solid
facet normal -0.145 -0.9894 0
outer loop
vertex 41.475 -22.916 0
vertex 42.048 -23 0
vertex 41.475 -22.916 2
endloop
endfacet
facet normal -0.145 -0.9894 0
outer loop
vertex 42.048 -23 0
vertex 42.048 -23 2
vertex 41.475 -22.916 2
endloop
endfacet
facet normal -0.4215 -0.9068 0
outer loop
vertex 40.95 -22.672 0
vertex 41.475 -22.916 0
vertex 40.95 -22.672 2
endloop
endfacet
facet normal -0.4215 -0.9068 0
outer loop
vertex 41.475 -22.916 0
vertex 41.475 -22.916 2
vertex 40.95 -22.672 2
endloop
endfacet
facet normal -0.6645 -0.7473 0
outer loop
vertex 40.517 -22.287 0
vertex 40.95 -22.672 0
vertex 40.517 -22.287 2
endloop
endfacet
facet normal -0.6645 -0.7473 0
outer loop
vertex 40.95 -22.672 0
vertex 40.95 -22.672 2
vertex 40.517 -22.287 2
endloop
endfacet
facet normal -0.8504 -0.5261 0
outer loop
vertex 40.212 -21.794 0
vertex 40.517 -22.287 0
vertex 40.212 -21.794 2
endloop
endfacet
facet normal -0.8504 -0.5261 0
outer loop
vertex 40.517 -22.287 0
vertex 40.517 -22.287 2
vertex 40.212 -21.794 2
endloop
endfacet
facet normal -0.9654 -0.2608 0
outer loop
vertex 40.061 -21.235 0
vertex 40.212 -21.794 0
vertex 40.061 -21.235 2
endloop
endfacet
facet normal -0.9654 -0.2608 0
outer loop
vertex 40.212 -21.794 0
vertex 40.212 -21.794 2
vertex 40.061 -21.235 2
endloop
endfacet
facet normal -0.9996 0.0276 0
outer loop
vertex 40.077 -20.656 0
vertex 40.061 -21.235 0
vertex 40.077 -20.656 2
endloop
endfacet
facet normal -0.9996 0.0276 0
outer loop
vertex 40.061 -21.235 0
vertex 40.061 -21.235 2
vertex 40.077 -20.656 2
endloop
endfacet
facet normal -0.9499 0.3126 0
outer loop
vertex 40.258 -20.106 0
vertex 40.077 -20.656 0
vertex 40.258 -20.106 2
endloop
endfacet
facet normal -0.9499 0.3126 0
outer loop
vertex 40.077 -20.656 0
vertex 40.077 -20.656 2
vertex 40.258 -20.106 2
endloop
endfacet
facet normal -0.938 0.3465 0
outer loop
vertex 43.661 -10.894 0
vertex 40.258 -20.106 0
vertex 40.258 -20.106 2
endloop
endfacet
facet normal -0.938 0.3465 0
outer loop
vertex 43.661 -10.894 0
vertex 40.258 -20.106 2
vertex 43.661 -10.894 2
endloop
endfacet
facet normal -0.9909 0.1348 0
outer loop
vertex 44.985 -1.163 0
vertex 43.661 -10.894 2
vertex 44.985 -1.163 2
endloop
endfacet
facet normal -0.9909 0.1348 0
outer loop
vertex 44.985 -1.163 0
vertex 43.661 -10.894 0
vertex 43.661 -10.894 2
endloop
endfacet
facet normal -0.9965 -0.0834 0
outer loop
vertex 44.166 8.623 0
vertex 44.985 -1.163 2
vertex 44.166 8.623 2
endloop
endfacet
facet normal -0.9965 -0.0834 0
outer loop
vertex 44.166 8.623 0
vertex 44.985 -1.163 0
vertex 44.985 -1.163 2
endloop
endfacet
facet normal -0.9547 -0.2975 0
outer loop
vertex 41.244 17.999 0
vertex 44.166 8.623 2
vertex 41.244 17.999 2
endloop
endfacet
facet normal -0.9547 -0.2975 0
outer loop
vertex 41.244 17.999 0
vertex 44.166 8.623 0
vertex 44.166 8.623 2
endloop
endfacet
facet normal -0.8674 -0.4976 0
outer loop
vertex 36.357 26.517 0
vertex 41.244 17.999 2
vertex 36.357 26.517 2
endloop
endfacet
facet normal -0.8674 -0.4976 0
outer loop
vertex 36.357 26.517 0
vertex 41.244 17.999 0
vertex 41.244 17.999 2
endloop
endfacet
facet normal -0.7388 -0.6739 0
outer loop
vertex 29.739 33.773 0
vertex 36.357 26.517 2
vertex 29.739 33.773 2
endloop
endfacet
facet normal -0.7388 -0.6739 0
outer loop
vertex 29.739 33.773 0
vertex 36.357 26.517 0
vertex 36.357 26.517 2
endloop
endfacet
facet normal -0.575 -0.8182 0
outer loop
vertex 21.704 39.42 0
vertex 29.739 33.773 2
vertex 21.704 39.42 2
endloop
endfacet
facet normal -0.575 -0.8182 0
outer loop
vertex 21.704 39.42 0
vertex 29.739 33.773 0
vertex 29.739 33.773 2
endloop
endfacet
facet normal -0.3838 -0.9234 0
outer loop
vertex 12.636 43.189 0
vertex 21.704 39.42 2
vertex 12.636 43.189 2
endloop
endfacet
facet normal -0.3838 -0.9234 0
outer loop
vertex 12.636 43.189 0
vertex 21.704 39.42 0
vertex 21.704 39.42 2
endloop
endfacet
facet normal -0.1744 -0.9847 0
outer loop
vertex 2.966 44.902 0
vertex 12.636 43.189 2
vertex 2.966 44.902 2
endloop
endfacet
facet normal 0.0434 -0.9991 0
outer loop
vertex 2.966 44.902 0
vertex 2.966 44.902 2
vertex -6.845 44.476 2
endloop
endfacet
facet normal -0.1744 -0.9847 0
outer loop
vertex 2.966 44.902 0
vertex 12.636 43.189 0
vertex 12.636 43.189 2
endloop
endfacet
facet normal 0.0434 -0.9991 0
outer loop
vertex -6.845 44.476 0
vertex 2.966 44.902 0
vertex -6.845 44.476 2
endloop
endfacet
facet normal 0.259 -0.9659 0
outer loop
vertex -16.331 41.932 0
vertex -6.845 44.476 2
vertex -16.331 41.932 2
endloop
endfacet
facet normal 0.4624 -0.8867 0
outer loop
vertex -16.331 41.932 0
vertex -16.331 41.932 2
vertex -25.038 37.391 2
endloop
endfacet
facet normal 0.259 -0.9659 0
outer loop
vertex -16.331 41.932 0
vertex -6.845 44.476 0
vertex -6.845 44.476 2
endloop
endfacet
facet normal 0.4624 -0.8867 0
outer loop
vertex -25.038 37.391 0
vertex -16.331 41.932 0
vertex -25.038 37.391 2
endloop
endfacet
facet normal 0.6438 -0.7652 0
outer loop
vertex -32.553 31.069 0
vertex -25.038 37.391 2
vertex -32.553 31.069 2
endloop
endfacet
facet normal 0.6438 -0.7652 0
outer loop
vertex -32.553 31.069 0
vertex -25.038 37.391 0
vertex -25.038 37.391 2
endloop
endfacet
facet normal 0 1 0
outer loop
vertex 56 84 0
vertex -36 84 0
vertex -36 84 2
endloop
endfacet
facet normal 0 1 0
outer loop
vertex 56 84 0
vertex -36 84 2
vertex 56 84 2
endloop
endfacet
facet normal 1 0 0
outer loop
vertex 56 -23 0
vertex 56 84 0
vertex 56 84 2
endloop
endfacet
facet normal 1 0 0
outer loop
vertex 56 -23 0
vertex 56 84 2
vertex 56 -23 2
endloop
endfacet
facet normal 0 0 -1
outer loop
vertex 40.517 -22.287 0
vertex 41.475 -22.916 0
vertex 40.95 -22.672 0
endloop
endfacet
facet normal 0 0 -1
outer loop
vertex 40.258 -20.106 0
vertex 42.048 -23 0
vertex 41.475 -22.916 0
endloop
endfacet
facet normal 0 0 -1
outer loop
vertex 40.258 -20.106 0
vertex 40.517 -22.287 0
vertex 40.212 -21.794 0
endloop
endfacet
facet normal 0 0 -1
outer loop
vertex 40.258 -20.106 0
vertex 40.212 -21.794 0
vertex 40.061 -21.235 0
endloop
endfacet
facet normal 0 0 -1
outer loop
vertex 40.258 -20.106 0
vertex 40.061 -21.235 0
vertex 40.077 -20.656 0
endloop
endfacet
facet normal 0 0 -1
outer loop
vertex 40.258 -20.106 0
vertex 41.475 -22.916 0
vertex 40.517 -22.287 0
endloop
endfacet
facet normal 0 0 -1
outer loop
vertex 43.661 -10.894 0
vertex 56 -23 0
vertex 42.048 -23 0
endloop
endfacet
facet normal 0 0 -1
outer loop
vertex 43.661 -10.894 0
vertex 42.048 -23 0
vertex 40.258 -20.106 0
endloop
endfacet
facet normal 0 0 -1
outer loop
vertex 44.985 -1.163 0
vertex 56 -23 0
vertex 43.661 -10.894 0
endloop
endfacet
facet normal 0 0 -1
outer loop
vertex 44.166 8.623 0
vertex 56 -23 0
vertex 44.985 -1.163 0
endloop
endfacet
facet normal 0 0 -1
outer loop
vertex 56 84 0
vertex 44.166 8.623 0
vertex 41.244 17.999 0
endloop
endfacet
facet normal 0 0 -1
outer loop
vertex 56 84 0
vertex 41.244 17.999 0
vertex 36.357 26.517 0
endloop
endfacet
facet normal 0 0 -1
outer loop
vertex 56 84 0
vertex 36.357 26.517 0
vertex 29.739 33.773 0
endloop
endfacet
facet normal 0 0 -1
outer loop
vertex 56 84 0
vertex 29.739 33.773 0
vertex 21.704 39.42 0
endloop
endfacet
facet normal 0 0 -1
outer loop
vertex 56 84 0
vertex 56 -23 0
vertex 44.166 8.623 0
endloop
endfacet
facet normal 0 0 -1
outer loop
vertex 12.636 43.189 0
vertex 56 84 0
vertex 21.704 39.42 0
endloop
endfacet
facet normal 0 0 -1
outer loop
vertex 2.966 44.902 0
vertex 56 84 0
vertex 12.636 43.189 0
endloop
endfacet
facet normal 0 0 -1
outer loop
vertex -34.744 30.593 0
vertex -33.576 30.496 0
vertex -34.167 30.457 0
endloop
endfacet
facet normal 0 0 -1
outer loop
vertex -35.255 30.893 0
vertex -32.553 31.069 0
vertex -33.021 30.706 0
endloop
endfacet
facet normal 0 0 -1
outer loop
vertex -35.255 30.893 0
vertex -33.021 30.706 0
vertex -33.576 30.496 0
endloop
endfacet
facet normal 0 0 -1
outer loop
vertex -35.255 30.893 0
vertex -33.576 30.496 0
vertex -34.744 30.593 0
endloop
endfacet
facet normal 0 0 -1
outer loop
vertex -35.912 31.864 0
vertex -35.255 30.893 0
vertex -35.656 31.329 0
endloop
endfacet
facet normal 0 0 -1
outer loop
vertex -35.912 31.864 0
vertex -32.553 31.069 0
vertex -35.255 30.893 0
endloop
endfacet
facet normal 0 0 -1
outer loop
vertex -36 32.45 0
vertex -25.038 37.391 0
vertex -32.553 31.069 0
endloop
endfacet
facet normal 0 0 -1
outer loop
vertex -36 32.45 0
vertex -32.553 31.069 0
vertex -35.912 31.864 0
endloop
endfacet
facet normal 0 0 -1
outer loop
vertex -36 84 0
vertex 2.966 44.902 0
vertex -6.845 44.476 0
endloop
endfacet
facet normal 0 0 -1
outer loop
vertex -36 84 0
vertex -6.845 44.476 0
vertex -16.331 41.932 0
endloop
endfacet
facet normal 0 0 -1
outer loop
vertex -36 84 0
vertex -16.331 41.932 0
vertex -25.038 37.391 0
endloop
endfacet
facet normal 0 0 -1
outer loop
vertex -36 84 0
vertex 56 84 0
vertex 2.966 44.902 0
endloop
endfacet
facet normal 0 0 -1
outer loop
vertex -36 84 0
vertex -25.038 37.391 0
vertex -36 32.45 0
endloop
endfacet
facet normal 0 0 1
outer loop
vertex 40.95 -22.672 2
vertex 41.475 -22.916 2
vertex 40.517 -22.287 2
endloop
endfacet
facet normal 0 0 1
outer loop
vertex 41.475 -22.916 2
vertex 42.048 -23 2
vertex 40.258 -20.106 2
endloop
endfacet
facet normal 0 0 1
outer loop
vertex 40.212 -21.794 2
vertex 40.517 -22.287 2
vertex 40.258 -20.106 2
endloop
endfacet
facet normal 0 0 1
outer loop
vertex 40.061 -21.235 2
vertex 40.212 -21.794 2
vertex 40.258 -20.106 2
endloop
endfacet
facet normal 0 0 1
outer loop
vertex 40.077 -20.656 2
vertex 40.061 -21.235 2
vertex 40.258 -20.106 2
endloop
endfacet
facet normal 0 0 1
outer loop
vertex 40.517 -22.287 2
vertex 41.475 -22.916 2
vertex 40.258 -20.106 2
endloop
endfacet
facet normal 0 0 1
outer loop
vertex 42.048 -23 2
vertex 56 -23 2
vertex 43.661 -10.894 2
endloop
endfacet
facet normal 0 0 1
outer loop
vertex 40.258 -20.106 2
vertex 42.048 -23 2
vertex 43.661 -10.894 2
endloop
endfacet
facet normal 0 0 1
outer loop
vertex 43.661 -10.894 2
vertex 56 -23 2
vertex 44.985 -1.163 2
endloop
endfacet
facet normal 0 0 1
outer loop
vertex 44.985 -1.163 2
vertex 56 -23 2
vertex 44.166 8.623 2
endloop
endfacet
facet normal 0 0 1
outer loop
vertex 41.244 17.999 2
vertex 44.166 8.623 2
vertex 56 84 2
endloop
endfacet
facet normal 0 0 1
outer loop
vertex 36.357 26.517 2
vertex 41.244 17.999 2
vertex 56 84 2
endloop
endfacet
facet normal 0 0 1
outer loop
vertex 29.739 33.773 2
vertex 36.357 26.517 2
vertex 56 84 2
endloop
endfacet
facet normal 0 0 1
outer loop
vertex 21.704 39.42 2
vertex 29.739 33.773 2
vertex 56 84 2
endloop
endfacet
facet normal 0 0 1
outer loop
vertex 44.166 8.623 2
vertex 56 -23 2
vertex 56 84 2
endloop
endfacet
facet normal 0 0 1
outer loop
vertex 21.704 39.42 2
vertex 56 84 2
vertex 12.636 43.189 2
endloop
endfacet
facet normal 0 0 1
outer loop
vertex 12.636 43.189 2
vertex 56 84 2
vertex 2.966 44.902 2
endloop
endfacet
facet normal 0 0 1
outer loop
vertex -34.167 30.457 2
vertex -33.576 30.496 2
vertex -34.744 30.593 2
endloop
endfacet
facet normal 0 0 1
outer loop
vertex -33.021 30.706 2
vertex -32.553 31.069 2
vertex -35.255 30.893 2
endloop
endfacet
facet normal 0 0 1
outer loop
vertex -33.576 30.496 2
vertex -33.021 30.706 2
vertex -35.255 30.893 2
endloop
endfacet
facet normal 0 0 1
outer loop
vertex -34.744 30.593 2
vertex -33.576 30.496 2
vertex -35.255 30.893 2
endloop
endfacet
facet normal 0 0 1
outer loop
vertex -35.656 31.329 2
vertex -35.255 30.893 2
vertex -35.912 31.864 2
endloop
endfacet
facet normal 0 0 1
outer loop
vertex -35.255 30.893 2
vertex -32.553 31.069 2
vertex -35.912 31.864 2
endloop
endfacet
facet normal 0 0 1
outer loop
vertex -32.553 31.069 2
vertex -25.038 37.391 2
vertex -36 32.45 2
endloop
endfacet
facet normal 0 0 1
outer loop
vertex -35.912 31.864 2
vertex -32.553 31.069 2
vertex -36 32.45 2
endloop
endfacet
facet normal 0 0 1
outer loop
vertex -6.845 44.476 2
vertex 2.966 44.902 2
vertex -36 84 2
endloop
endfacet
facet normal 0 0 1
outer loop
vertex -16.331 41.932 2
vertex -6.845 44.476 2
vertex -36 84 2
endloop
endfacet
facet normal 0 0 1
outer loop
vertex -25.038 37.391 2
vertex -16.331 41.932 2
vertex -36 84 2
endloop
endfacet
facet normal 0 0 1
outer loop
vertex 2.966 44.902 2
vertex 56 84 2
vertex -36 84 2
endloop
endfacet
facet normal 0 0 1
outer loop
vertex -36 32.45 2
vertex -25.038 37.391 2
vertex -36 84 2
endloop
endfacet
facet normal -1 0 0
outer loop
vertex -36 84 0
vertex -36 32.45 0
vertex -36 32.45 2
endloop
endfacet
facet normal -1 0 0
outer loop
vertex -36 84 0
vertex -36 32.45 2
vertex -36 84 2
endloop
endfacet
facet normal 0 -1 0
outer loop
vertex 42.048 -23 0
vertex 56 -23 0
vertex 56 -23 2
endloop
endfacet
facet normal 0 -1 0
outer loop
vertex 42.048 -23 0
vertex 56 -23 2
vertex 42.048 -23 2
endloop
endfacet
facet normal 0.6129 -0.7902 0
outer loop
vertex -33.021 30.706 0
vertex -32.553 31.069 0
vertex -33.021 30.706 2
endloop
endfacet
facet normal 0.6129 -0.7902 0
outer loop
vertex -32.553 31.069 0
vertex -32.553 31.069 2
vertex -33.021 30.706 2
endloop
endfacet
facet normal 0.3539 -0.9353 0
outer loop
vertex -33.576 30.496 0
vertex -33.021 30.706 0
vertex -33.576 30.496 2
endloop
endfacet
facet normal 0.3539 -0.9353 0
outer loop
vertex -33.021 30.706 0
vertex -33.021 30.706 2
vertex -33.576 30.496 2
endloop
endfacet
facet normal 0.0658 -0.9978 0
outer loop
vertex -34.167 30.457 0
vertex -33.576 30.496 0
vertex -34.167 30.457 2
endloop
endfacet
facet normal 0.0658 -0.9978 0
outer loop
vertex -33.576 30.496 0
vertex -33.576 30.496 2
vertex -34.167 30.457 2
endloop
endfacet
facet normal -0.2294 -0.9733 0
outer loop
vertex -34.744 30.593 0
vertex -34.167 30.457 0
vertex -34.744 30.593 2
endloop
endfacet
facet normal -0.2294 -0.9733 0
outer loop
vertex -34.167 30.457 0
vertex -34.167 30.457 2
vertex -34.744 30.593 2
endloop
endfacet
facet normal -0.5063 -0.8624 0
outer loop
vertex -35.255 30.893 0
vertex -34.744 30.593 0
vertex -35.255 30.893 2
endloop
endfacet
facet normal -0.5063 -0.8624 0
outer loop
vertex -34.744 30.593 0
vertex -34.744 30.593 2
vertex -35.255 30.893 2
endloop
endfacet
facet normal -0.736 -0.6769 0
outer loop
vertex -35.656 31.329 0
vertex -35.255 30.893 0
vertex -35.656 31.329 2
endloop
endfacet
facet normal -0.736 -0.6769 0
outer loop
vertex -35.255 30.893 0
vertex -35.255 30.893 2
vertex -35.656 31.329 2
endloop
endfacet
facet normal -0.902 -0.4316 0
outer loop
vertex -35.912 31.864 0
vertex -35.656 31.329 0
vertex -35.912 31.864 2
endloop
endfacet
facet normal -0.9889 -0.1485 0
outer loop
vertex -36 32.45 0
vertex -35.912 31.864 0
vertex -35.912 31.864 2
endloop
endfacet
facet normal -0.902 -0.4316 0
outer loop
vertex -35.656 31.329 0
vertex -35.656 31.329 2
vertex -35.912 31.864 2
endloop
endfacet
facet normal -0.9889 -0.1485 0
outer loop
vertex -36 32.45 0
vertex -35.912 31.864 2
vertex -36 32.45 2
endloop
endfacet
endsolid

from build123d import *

# Parameters (mm, degrees)
BOSS_EXTRU_1_DEPTH = 2
CONG_1_R           = 2


with BuildPart() as part:
    # Esquisse1 → Boss.-Extru.1 (new body)
    with BuildSketch(Plane.XY):
        with BuildLine():
            Line((-36, 84), (56, 84))
            Line((56, 84), (56, -23))
            Line((56, -23), (38.678159212, -23))
            ThreePointArc((38.678159212, -23), (25.035836998, 37.392604427), (-36, 27))
            Line((-36, 27), (-36, 84))
        make_face()
    extrude(amount=BOSS_EXTRU_1_DEPTH)

    # Congé1
    cong_1_edges = [part.edges().sort_by_distance(p)[0] for p in [
        (38.678159212, -23, 1),
        (-36, 27, 1),
    ]]
    fillet(cong_1_edges, radius=CONG_1_R)


solid = part.part
